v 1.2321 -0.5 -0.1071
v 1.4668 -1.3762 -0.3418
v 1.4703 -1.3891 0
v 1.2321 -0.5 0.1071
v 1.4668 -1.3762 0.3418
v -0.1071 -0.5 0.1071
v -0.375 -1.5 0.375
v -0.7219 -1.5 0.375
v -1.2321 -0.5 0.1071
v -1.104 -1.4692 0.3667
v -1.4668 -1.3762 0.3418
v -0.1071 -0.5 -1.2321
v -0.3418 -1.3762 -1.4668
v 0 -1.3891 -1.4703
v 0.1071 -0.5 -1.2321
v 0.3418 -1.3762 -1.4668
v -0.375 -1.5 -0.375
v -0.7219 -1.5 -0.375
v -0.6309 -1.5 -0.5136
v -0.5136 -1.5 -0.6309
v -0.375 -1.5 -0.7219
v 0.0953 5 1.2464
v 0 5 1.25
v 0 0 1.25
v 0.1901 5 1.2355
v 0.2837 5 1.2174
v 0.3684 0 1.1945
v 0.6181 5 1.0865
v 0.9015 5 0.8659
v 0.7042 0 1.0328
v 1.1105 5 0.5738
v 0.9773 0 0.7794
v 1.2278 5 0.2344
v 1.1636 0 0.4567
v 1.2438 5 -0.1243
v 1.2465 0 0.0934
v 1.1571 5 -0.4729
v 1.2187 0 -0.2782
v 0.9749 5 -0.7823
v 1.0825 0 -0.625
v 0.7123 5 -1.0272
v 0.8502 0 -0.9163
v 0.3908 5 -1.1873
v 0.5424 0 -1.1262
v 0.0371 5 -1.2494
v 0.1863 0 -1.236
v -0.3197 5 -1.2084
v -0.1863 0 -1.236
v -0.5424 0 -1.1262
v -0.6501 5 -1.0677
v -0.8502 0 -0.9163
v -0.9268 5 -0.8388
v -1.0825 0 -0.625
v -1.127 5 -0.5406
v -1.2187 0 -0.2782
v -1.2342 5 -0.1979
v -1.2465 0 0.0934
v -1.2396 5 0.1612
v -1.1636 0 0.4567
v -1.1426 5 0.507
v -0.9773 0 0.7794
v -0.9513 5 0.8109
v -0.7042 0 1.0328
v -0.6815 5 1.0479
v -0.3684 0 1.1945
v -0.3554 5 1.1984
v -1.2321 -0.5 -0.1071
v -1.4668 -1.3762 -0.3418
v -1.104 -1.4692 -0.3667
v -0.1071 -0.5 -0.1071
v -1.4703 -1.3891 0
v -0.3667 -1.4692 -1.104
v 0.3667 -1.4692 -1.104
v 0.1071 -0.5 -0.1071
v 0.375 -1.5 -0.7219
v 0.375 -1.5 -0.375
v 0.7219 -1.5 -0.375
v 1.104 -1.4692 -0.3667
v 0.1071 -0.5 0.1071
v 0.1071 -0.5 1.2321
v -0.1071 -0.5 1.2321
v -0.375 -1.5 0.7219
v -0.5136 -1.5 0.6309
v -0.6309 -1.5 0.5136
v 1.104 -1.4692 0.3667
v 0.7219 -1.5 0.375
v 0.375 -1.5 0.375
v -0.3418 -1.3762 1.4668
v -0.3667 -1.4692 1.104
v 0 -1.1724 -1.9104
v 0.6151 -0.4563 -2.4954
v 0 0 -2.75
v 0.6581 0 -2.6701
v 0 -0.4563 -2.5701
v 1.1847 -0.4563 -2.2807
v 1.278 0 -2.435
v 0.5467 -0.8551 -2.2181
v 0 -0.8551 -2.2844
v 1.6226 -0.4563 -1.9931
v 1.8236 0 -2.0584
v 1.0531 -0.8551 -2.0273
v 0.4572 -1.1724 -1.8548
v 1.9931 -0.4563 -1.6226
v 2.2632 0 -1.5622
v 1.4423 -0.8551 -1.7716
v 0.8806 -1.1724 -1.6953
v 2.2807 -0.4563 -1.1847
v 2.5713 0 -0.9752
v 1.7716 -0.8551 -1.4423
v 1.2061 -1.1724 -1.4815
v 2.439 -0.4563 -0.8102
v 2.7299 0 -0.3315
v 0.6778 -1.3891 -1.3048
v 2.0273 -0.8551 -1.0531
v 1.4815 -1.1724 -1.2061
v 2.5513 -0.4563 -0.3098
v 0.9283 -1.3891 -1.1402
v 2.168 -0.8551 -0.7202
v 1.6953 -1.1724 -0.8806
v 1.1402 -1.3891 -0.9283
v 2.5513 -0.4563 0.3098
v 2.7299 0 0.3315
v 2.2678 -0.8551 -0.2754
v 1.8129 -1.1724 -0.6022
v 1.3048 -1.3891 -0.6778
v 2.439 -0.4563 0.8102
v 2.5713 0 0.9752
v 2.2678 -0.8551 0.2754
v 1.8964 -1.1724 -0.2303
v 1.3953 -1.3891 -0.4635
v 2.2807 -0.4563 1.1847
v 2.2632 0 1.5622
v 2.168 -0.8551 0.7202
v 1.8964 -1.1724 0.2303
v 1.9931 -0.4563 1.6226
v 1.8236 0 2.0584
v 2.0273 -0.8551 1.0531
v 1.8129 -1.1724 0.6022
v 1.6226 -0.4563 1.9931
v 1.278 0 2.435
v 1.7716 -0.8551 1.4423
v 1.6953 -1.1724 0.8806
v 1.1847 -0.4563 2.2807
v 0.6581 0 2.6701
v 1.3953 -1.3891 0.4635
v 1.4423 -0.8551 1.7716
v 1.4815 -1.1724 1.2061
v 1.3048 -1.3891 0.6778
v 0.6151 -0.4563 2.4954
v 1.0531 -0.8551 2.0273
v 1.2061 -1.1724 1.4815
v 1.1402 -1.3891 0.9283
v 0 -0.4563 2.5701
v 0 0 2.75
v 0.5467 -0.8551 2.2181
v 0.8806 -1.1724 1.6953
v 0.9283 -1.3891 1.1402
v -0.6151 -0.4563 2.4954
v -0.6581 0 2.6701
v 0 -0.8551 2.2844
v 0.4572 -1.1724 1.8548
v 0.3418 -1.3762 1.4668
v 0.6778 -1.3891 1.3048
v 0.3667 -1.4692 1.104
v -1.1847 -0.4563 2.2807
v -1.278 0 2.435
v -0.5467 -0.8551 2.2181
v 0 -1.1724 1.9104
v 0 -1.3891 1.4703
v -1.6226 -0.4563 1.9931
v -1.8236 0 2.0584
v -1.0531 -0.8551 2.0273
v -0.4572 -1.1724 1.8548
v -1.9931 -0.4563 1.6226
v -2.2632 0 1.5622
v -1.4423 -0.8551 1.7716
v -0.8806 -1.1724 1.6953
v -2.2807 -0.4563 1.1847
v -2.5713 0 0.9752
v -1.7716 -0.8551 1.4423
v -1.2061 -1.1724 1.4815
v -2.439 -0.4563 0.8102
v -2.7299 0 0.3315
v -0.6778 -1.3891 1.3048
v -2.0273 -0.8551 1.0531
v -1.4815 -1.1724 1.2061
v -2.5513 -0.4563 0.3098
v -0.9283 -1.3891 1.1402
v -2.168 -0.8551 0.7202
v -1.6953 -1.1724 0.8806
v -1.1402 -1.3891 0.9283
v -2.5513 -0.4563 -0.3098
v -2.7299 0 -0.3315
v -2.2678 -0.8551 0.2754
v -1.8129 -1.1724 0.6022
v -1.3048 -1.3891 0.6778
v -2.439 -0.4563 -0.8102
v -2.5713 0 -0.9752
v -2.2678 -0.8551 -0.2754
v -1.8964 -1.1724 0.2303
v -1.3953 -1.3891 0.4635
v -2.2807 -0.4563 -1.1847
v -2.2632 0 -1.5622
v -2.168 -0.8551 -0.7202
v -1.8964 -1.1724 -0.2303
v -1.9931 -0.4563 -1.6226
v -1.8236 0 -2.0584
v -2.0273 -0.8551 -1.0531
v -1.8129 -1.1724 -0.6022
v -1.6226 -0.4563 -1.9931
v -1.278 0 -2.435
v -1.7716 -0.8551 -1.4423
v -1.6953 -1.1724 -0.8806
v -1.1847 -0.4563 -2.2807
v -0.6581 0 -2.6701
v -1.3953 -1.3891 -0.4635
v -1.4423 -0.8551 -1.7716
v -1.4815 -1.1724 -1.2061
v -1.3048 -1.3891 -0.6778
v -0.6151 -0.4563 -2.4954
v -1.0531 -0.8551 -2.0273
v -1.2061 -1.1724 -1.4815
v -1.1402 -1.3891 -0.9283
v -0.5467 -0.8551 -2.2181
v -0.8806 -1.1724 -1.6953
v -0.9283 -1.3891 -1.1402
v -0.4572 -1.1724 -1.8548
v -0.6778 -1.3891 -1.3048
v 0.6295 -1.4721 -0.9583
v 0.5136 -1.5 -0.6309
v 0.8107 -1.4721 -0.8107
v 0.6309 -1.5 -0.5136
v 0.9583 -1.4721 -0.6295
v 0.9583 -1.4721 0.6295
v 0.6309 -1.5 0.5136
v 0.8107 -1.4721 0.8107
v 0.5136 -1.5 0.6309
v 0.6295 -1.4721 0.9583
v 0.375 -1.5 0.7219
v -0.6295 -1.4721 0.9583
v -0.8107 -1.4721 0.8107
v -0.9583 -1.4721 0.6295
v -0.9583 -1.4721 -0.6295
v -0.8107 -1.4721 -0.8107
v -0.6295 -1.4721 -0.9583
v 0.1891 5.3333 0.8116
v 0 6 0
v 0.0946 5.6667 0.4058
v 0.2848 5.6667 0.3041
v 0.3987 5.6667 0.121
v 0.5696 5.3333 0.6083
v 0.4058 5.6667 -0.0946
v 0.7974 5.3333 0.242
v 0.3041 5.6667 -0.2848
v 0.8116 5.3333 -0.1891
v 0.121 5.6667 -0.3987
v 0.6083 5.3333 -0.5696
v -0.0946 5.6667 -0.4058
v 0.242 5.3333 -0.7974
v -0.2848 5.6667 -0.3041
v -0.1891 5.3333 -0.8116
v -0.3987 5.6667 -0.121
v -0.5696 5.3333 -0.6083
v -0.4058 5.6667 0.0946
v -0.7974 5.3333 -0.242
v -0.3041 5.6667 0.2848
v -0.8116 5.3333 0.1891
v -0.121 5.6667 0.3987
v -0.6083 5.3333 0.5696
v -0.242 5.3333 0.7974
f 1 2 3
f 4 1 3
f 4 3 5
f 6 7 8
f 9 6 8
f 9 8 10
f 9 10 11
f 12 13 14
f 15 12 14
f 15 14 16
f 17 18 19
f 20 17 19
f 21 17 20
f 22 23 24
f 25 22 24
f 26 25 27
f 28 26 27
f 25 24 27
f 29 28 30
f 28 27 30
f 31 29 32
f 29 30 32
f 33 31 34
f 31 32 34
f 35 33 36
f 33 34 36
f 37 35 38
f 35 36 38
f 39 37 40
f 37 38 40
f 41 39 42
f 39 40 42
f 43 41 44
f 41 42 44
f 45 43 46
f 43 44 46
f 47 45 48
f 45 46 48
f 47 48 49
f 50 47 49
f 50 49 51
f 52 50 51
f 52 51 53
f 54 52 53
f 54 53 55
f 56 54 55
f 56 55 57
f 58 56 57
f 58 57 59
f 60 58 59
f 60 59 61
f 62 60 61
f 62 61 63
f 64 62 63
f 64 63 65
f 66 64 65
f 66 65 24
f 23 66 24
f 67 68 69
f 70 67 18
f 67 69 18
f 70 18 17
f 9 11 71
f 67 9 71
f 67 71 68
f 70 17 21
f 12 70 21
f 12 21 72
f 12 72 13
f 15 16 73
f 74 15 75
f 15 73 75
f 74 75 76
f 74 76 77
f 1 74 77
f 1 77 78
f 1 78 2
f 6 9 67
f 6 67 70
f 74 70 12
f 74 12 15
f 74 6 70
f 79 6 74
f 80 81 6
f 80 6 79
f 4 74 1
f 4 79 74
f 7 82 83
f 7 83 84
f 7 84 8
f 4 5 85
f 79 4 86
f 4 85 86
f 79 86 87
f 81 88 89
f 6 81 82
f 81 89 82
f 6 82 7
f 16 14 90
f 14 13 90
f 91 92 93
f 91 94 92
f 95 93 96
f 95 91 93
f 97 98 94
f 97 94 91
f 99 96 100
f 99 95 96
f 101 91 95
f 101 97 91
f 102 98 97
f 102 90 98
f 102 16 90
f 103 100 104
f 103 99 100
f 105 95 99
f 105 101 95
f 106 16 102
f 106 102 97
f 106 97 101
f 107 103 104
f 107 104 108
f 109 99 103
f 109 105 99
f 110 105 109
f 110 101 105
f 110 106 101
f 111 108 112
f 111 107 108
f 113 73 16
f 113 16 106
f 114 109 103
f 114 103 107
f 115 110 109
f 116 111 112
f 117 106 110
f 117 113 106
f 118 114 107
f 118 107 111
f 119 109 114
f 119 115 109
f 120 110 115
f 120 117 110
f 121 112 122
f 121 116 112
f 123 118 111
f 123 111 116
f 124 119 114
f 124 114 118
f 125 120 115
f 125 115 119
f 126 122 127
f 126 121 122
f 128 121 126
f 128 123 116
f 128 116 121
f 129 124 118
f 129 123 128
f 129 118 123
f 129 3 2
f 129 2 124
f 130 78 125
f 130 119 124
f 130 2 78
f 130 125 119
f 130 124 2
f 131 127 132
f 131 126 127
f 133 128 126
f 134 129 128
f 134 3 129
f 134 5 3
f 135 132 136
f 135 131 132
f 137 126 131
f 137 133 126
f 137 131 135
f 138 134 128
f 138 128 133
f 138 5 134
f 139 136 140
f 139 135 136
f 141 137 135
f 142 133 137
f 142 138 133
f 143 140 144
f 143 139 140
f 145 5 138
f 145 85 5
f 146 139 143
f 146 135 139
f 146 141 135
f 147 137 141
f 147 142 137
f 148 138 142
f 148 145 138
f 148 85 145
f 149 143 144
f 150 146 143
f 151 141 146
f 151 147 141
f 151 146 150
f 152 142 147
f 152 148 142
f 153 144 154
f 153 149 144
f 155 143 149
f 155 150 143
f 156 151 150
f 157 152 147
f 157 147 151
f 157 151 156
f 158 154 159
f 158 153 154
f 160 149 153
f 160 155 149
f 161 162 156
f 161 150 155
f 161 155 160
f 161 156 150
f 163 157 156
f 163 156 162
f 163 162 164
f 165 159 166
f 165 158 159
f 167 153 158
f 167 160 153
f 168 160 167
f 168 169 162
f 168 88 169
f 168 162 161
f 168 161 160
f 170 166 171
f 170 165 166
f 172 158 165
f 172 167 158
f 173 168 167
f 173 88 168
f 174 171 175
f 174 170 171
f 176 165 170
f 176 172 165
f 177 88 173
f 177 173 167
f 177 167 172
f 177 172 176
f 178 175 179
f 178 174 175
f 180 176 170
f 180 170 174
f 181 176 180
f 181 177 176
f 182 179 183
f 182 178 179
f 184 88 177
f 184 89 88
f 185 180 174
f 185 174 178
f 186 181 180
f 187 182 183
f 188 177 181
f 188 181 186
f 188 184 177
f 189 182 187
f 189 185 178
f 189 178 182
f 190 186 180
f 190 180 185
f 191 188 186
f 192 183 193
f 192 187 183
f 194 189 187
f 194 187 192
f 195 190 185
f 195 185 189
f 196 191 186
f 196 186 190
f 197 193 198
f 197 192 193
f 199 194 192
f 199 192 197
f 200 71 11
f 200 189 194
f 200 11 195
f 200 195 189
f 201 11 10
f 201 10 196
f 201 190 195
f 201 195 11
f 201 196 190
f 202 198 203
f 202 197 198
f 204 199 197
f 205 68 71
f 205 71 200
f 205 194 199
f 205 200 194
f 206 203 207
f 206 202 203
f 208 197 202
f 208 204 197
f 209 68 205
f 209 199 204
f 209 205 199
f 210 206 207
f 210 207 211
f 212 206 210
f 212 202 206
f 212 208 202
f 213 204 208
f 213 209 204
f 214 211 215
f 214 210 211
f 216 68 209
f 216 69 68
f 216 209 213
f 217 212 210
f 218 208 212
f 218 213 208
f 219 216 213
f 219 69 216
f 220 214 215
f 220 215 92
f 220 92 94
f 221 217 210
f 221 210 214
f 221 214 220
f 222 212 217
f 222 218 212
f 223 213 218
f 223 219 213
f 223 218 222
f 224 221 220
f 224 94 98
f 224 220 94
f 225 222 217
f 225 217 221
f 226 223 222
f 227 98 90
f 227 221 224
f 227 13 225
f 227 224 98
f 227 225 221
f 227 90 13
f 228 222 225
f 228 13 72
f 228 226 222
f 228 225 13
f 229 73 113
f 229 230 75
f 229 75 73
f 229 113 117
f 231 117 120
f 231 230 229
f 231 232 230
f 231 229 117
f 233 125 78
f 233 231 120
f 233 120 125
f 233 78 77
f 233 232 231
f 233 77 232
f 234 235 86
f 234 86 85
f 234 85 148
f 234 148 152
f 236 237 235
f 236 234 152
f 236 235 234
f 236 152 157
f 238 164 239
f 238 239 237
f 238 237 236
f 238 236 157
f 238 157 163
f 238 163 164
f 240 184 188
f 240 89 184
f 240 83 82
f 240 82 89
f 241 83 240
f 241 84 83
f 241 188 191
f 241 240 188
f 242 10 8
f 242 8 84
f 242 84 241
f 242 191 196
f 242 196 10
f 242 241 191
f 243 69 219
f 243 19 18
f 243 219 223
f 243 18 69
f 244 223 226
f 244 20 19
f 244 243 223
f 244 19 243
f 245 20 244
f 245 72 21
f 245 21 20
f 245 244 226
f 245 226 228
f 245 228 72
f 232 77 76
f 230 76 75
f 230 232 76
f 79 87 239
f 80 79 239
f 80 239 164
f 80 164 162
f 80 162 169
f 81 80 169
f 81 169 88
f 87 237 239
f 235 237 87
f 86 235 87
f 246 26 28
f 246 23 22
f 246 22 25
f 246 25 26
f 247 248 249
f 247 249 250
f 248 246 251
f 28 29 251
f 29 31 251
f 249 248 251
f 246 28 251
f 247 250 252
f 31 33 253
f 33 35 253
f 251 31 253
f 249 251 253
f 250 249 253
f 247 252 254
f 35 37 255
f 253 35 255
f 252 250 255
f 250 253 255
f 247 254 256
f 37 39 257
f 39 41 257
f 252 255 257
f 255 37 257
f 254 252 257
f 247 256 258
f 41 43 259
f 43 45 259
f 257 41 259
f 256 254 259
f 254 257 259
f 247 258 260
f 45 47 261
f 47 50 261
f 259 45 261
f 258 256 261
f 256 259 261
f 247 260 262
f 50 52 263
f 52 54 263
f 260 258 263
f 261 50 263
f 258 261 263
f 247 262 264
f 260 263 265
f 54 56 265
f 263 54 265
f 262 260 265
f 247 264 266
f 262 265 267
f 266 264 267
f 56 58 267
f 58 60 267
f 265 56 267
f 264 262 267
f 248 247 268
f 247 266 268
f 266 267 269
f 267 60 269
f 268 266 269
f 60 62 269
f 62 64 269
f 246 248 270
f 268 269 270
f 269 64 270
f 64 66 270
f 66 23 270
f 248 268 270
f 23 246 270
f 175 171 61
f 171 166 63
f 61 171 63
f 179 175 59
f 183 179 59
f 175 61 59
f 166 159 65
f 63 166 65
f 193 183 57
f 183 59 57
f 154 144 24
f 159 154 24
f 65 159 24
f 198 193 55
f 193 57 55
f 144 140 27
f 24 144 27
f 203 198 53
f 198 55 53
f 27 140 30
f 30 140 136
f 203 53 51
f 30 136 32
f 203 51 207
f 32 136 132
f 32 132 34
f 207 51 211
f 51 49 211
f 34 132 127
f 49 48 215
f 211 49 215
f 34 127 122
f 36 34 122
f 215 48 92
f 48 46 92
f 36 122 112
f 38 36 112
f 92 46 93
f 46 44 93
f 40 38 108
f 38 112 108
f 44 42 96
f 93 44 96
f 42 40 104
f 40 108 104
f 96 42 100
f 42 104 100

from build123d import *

# Parameters (mm, degrees)
SKETCH1_R           = 1.25
BOSS_EXTRUDE1_DEPTH = 5
SKETCH2_R           = 2.75
BOSS_EXTRUDE2_DEPTH = 1.5
FILLET1_R           = 2
CUT_EXTRUDE1_DEPTH  = 1
CUT_EXTRUDE1_DRAFT  = -15


with BuildPart() as part:
    # Sketch1 → Boss-Extrude1 (new body)
    with BuildSketch(Plane(origin=(0, 0, 0), x_dir=(1, 0, 0), z_dir=(0, 1, 0))):
        with Locations(Location((0, 0, 0), (0, 0, 270))):
            Circle(SKETCH1_R)
    extrude(amount=BOSS_EXTRUDE1_DEPTH)

    # Sketch2 → Boss-Extrude2 (add)
    with BuildSketch(Plane.XZ):
        with Locations(Location((0, 0, 0), (0, 0, 270))):
            Circle(SKETCH2_R)
    extrude(amount=BOSS_EXTRUDE2_DEPTH)

    # Fillet1
    # the kernel refuses this fillet: 2 mm, written as the material it takes off along each edge
    with BuildSketch(Plane(origin=(0, -1.5, 0), x_dir=(0, 0, -1), z_dir=(-1, 0, 0))) as fillet1_piece_1:
        with BuildLine():
            CenterArc((0.813508327, -2), FILLET1_R, 14.477512186, 75.522487814)
            Line((0.813508327, 0), (0.813508327, 0.04))
            Line((0.813508327, 0.04), (2.75, 0.04))
            Line((2.75, 0.04), (2.79, 0))
            ThreePointArc((2.79, 0), (2.79, -0.75), (2.788729833, -1.49))
            Line((2.788729833, -1.49), (2.75, -1.5))
        make_face()
    revolve(axis=Axis((0, -1.5, 0), (0, -1, 0)), mode=Mode.SUBTRACT)


with BuildPart() as cut_extrude1_tool:
    # Sketch3 → Cut-Extrude1 (with draft: the straight prism first)
    with BuildSketch(Plane.XZ.offset(1.5)):
        Polygon((0.375, 0.375), (0.375, 1.5), (-0.375, 1.5), (-0.375, 0.375), (-1.5, 0.375), (-1.5, -0.375), (-0.375, -0.375), (-0.375, -1.5), (0.375, -1.5), (0.375, -0.375), (1.5, -0.375), (1.5, 0.375), align=None)
    extrude(amount=-CUT_EXTRUDE1_DEPTH)
    # Cut-Extrude1: the draft: its side faces are tilted about the plane it starts from
    cut_extrude1_sides = [cut_extrude1_tool.faces().sort_by_distance(p)[0] for p in [
        (0.375, -1, 0.9375),
        (0, -1, 1.5),
        (-0.375, -1, 0.9375),
        (-0.9375, -1, 0.375),
        (-1.5, -1, 0),
        (-0.9375, -1, -0.375),
        (-0.375, -1, -0.9375),
        (0, -1, -1.5),
        (0.375, -1, -0.9375),
        (0.9375, -1, -0.375),
        (1.5, -1, 0),
        (0.9375, -1, 0.375),
    ]]
    draft(cut_extrude1_sides, Plane.XZ.offset(1.5), CUT_EXTRUDE1_DRAFT)


with BuildPart() as part_1:
    add(part.part)

    # Cut-Extrude1: cut by cut_extrude1_tool
    add(cut_extrude1_tool.part, mode=Mode.SUBTRACT)

    # Sketch11 → Revolve2 (revolve)
    with BuildSketch(Plane.XY, mode=Mode.PRIVATE) as revolve2_sk:
        Polygon((0, 5), (0, 6), (-1.25, 5), align=None)
    revolve(revolve2_sk.sketch.rotate(Axis((0, 5, 0), (0, 1, 0)), 103.11828208), axis=Axis((0, 5, 0), (0, 1, 0)))


solid = part_1.part
